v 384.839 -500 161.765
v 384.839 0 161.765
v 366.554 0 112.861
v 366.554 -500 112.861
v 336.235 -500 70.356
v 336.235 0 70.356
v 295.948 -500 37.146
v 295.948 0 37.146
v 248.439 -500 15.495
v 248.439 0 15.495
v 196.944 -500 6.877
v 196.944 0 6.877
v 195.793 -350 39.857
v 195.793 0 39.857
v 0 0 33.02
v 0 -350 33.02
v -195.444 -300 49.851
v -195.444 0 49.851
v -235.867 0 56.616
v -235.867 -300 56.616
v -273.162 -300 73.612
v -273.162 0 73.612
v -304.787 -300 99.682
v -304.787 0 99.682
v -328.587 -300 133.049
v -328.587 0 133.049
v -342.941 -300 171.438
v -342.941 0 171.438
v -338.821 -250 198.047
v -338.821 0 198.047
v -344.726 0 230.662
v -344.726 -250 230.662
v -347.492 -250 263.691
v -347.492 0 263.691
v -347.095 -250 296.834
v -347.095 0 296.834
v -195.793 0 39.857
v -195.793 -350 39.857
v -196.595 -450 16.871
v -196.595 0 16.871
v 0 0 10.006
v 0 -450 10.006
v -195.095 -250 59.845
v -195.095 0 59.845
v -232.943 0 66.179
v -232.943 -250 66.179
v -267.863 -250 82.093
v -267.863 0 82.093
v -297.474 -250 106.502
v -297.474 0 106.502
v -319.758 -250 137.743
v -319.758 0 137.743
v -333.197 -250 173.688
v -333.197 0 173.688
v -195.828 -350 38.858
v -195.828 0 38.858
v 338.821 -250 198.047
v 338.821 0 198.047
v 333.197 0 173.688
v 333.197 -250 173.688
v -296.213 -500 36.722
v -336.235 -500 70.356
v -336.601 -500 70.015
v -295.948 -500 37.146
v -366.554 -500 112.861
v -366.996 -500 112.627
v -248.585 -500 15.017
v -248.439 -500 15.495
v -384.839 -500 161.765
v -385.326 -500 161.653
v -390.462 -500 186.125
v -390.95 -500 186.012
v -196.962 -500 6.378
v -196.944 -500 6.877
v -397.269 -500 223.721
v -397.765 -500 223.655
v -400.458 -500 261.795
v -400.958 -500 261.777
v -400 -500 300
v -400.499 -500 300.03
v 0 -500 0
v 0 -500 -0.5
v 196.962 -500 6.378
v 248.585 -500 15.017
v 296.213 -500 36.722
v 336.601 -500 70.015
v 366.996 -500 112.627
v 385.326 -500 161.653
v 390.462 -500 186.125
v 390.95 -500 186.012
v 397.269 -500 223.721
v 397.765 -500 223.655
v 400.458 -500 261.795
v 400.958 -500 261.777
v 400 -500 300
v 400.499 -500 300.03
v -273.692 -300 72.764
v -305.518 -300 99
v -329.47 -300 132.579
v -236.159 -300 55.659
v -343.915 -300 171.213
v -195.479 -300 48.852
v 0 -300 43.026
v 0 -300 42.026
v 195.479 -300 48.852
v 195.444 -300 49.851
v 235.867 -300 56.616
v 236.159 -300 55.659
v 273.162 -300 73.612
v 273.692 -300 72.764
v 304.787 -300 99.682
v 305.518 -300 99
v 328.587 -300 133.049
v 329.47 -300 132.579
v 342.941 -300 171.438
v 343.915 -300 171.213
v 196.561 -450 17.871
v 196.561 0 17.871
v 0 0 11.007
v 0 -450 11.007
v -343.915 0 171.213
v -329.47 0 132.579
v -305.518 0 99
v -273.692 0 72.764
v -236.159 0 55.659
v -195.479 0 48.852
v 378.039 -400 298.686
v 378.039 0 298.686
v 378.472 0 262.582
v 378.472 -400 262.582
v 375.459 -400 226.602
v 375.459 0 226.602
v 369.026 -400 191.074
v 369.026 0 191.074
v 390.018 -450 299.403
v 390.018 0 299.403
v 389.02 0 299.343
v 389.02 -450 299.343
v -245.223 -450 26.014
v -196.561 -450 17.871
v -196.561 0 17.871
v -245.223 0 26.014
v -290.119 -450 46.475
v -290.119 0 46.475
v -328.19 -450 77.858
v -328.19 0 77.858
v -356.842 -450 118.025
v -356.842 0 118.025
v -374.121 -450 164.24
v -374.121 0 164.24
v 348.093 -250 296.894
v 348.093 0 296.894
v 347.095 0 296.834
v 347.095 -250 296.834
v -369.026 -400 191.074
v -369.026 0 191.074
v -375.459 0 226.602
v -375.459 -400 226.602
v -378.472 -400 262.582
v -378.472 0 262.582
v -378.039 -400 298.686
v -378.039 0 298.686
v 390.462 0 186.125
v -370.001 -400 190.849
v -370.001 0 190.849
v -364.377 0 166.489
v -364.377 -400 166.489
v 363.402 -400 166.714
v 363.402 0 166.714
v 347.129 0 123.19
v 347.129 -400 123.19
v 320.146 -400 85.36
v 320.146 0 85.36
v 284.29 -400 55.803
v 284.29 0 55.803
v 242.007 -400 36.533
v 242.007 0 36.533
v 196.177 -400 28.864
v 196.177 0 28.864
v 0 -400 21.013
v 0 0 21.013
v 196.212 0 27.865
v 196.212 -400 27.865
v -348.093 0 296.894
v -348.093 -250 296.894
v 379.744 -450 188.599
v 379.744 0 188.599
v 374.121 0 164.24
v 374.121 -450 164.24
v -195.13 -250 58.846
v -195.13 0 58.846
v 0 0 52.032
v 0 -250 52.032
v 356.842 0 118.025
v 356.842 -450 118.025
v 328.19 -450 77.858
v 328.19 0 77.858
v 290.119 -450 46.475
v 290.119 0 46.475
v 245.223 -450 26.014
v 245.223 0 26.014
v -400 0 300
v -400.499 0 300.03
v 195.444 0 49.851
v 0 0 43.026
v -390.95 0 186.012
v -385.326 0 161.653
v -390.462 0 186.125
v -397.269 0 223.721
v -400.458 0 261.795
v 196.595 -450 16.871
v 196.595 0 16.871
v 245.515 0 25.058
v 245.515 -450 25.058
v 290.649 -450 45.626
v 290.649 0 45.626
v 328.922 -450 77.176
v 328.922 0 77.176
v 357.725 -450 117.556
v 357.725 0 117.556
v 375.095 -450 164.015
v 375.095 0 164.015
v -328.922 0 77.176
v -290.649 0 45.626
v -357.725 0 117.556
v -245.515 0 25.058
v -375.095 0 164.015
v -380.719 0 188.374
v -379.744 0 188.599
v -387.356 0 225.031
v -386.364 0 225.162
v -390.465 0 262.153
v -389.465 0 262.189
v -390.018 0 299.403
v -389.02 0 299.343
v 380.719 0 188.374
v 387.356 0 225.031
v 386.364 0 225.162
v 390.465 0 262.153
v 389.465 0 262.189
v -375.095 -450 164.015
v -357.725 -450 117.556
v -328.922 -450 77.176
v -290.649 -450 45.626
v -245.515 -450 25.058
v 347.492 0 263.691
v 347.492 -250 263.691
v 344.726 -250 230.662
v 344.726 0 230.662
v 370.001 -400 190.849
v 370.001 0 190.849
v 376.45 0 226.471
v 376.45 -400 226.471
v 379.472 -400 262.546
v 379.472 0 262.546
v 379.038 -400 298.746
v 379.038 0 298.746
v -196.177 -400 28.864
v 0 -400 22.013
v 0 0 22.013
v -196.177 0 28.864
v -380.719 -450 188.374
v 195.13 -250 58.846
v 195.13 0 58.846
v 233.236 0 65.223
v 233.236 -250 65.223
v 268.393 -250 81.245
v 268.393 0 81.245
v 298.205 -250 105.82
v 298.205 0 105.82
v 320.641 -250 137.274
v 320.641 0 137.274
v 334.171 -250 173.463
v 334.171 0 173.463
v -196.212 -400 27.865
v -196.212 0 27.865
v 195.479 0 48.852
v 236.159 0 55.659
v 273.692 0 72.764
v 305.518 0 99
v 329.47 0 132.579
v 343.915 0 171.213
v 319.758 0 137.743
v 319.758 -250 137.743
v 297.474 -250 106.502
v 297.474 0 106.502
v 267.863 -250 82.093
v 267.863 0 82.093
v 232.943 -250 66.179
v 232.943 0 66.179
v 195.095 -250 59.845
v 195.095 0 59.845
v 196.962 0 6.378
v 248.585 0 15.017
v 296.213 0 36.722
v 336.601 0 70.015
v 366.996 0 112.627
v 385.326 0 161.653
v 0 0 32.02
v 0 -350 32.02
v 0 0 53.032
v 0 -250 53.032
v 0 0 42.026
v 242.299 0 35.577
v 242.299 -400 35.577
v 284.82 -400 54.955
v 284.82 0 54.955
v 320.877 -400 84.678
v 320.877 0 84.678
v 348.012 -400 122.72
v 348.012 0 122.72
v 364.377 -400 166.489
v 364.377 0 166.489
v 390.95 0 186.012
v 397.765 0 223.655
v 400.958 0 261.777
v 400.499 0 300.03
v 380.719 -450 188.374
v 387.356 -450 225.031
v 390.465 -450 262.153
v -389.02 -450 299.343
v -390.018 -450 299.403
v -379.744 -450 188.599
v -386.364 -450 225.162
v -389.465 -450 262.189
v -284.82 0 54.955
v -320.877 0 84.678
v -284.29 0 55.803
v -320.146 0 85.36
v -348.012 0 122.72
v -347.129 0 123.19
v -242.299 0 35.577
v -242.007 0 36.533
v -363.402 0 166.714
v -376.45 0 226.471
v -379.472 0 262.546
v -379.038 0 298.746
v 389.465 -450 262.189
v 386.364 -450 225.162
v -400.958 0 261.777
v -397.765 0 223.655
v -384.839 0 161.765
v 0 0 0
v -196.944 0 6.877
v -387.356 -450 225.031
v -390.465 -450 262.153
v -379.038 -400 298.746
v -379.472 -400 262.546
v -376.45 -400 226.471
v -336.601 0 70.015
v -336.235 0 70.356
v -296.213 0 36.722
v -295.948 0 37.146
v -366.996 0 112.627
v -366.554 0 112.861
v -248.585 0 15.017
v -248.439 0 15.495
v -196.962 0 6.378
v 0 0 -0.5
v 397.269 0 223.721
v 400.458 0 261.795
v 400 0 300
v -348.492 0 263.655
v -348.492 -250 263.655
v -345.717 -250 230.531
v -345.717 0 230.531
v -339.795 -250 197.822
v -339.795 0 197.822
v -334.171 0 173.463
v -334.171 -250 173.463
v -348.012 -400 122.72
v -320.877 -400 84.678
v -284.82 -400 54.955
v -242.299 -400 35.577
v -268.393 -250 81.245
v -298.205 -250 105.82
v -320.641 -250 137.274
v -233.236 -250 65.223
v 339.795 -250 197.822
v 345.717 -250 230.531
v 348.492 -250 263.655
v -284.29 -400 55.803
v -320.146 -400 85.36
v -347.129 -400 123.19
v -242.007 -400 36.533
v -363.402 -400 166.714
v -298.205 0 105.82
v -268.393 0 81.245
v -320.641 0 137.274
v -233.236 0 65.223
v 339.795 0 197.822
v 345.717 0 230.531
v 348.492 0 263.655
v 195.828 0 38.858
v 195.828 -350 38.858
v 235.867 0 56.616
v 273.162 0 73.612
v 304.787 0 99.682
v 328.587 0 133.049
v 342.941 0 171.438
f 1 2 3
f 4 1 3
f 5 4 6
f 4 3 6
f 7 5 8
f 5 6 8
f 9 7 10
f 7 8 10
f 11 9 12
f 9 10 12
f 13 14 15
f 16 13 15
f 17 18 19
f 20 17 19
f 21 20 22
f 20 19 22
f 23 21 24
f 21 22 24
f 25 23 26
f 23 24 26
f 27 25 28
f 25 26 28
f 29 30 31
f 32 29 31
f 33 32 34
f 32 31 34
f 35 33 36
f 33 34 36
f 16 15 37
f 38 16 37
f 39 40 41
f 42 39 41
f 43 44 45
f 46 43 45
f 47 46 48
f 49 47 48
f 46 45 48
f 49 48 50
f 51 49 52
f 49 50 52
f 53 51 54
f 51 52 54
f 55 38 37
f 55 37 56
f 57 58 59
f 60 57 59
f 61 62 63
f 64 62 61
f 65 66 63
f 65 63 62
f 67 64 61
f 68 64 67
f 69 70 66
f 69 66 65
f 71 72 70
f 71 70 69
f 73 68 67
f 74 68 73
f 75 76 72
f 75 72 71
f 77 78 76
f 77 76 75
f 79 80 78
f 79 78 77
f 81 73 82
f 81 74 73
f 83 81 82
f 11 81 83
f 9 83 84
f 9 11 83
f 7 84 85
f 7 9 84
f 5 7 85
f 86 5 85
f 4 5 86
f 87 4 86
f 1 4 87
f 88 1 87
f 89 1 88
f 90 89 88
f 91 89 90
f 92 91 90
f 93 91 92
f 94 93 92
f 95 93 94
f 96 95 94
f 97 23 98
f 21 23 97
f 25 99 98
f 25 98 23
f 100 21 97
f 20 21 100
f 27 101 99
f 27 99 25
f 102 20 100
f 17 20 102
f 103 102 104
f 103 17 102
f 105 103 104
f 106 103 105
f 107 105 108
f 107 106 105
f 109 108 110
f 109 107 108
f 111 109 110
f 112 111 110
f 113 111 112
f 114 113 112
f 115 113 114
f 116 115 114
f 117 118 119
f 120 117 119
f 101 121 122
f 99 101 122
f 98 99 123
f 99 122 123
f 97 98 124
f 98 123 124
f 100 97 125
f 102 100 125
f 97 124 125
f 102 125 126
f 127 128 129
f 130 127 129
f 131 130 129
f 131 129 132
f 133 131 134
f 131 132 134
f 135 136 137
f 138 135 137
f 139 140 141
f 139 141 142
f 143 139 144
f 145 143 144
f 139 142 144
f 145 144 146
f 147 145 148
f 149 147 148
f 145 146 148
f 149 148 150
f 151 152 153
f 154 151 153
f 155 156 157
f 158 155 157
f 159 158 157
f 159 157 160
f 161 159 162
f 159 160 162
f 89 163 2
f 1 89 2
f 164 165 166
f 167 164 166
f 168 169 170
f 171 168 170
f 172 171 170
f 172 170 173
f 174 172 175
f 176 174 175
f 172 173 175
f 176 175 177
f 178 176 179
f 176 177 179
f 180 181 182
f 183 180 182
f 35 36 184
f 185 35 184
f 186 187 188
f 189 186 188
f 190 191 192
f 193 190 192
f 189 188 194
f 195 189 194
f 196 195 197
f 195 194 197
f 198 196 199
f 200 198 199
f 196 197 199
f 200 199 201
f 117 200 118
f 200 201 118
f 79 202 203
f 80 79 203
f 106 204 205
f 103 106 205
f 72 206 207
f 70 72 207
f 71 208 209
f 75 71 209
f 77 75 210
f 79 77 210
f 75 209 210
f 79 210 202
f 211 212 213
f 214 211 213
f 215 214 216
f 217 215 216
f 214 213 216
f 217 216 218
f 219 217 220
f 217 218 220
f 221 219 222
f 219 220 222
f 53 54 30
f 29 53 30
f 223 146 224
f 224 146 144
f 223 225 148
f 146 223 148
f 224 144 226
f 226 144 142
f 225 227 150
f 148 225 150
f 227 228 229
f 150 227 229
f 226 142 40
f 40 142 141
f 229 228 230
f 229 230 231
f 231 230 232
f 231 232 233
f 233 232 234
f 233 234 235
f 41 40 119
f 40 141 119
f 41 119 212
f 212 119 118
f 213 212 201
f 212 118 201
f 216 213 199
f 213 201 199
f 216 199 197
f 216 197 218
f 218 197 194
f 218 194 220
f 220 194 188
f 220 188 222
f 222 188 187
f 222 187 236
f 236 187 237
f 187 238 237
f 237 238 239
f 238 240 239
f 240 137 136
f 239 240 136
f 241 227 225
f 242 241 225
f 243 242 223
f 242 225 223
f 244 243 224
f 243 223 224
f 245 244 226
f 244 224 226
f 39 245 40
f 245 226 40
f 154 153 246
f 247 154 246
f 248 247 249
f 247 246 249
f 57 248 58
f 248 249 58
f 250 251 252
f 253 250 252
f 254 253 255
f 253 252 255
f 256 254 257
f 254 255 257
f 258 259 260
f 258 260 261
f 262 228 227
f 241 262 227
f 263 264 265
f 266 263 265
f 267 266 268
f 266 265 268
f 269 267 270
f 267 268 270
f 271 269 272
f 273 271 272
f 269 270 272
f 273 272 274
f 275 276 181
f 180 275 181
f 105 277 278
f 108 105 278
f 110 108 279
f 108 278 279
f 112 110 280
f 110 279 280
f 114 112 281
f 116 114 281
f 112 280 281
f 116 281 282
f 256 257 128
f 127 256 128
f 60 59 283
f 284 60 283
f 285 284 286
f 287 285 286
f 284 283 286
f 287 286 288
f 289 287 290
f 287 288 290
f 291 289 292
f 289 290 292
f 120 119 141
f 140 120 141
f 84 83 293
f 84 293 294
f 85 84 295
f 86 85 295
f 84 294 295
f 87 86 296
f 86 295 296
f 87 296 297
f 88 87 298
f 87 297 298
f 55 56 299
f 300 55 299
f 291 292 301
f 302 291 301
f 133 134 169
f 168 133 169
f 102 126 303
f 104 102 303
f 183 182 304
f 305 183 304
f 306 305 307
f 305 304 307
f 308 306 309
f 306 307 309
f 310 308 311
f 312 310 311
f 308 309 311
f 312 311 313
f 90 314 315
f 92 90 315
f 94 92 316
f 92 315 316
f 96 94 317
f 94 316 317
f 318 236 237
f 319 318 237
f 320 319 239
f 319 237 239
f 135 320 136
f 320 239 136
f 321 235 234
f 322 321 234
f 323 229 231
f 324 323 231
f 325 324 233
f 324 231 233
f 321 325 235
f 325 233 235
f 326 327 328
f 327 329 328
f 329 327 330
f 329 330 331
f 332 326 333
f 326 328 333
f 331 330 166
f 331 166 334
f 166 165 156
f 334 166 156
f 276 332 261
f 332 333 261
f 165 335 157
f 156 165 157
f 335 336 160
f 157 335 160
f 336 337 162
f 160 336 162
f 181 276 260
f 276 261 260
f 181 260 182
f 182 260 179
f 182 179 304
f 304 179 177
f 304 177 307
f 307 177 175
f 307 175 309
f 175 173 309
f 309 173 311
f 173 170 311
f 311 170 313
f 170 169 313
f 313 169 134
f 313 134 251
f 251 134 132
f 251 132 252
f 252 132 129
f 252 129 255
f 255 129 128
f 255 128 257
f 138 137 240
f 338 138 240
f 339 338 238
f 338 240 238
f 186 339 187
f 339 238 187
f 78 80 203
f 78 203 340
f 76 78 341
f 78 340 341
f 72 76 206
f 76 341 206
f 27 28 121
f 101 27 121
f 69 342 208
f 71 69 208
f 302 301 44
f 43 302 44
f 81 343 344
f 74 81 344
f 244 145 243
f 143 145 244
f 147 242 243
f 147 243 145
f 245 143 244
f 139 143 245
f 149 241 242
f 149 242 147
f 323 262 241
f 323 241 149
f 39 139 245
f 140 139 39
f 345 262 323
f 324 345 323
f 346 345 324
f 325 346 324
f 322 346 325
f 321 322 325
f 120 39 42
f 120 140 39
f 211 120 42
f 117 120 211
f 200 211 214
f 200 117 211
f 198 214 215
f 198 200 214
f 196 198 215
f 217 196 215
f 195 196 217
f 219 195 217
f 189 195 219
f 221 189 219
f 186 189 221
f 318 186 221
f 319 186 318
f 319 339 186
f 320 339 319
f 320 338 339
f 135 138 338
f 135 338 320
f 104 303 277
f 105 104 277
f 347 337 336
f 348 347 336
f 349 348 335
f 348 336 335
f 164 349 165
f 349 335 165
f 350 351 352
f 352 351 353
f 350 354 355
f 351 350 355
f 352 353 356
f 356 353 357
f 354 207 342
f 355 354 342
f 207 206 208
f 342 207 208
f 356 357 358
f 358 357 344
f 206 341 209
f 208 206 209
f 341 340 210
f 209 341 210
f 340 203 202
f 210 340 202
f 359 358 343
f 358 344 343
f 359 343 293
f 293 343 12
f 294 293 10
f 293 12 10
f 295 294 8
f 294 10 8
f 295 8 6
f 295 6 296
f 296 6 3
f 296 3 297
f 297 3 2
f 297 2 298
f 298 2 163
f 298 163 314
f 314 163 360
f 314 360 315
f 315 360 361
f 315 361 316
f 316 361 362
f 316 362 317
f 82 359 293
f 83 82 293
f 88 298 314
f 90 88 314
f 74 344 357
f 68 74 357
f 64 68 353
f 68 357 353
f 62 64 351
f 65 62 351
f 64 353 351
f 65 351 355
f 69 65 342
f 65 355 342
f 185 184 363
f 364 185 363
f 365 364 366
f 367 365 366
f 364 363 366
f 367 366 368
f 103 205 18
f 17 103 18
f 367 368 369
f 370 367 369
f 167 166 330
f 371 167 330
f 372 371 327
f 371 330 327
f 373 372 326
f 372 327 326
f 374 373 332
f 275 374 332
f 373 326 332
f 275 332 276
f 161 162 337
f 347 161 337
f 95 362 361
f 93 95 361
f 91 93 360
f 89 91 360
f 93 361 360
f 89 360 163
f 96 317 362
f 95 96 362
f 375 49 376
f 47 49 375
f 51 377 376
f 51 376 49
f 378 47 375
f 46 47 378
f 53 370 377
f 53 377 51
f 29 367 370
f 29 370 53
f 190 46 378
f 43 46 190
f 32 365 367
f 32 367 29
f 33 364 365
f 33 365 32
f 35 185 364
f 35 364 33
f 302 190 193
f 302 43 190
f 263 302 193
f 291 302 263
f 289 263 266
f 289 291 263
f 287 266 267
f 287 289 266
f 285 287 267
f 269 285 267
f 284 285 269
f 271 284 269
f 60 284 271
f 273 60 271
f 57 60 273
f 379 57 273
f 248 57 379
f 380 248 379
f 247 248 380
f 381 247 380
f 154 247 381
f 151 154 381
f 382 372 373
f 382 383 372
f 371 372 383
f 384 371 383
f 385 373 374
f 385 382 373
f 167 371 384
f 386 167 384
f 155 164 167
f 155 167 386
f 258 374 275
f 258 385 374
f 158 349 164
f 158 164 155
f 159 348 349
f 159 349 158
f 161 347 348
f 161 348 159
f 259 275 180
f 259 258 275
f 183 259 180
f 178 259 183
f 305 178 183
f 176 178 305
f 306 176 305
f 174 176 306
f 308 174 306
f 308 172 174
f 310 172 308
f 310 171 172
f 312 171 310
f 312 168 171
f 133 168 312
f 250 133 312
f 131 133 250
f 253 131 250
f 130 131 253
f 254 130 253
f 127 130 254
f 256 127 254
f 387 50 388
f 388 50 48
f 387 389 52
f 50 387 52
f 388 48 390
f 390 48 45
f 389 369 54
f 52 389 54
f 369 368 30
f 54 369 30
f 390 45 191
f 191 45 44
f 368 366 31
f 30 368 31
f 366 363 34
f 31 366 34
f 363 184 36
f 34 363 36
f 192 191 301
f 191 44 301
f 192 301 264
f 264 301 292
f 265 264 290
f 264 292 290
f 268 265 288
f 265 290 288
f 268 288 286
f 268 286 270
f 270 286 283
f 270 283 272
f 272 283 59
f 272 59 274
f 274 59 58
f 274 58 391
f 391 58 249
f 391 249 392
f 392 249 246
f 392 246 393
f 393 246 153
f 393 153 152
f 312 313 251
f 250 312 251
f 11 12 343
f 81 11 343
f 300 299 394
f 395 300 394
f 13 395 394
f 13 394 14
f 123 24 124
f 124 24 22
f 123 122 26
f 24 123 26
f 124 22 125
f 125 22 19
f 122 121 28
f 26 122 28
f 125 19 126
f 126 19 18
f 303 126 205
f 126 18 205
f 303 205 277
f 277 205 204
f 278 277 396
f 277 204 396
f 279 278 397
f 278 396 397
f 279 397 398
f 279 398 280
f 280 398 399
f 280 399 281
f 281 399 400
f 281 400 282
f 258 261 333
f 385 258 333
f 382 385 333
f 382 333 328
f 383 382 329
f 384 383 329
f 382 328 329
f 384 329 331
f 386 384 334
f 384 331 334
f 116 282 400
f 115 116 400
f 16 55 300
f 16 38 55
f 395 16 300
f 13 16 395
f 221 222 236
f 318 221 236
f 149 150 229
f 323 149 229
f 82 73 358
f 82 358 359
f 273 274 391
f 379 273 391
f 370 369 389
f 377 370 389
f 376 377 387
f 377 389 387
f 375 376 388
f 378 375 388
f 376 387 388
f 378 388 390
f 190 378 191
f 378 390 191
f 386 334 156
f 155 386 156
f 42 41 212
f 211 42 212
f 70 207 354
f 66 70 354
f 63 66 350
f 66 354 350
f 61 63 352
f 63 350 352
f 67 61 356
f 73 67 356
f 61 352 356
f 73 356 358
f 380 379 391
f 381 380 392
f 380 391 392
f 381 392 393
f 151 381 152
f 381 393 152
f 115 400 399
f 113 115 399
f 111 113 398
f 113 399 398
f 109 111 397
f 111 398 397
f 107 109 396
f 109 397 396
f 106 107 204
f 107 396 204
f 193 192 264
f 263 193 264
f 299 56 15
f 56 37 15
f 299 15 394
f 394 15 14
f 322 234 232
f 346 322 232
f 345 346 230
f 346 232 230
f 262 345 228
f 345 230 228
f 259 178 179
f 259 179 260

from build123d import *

# Parameters (mm, degrees)
F1_DEPTH  = 500
F3_DEPTH  = 450
F5_DEPTH  = 400
F7_DEPTH  = 350
F9_DEPTH  = 300
F11_DEPTH = 250


with BuildPart() as f1:
    # F0 (on Front) → F1 (new body)
    with BuildSketch(Plane.XZ):
        with BuildLine():
            Line((196.944483, 6.877453), (0, 0))
            Line((0, 0), (-196.944483, 6.877453))
            ThreePointArc((-196.944483, 6.877453), (-317.180227, 52.430702), (-384.838596, 161.765407))
            Line((-384.838596, 161.765407), (-390.462373, 186.124659))
            ThreePointArc((-390.462373, 186.124659), (-399.318706, 242.719979), (-400, 300))
            Line((-400, 300), (-400.499107, 300.029869))
            ThreePointArc((-400.499107, 300.029869), (-399.816961, 242.678248), (-390.949558, 186.012184))
            Line((-390.949558, 186.012184), (-385.325781, 161.652932))
            ThreePointArc((-385.325781, 161.652932), (-317.498267, 52.044889), (-196.961933, 6.377757))
            Line((-196.961933, 6.377757), (0, -0.500305))
            Line((0, -0.500305), (196.961933, 6.377757))
            ThreePointArc((196.961933, 6.377757), (317.498267, 52.044889), (385.325781, 161.652932))
            Line((385.325781, 161.652932), (390.949558, 186.012184))
            ThreePointArc((390.949558, 186.012184), (399.816961, 242.678248), (400.499107, 300.029869))
            Line((400.499107, 300.029869), (400, 300))
            ThreePointArc((400, 300), (399.318706, 242.719979), (390.462373, 186.124659))
            Line((390.462373, 186.124659), (384.838596, 161.765407))
            ThreePointArc((384.838596, 161.765407), (317.180227, 52.430702), (196.944483, 6.877453))
        make_face()
    extrude(amount=F1_DEPTH)


with BuildPart() as f3:
    # F2 (on Front) → F3 (new body)
    with BuildSketch(Plane.XZ):
        with BuildLine():
            ThreePointArc((-390.017859, 299.402627), (-389.353597, 243.554607), (-380.718672, 188.37417))
            Line((-380.718672, 188.37417), (-375.094896, 164.014918))
            ThreePointArc((-375.094896, 164.014918), (-310.819445, 60.146947), (-196.595488, 16.871361))
            Line((-196.595488, 16.871361), (0, 10.006095))
            Line((0, 10.006095), (196.595488, 16.871361))
            ThreePointArc((196.595488, 16.871361), (310.819445, 60.146947), (375.094896, 164.014918))
            Line((375.094896, 164.014918), (380.718672, 188.37417))
            ThreePointArc((380.718672, 188.37417), (389.353597, 243.554607), (390.017859, 299.402627))
            Line((390.017859, 299.402627), (389.019645, 299.34289))
            ThreePointArc((389.019645, 299.34289), (388.357086, 243.63807), (379.744302, 188.599121))
            Line((379.744302, 188.599121), (374.120526, 164.239869))
            ThreePointArc((374.120526, 164.239869), (310.183367, 60.918572), (196.560588, 17.870752))
            Line((196.560588, 17.870752), (0, 11.006705))
            Line((0, 11.006705), (-196.560588, 17.870752))
            ThreePointArc((-196.560588, 17.870752), (-310.183367, 60.918572), (-374.120526, 164.239869))
            Line((-374.120526, 164.239869), (-379.744302, 188.599121))
            ThreePointArc((-379.744302, 188.599121), (-388.357086, 243.63807), (-389.019645, 299.34289))
            Line((-389.019645, 299.34289), (-390.017859, 299.402627))
        make_face()
    extrude(amount=F3_DEPTH)


with BuildPart() as f5:
    # F4 (on Front) → F5 (new body)
    with BuildSketch(Plane.XZ):
        with BuildLine():
            ThreePointArc((-379.037503, 298.745517), (-378.391977, 244.472697), (-370.000601, 190.848631))
            Line((-370.000601, 190.848631), (-364.376825, 166.48938))
            ThreePointArc((-364.376825, 166.48938), (-303.822585, 68.634818), (-196.211593, 27.86466))
            Line((-196.211593, 27.86466), (0, 21.0128))
            Line((0, 21.0128), (196.211593, 27.86466))
            ThreePointArc((196.211593, 27.86466), (303.822585, 68.634818), (364.376825, 166.48938))
            Line((364.376825, 166.48938), (370.000601, 190.848631))
            ThreePointArc((370.000601, 190.848631), (378.391977, 244.472697), (379.037503, 298.745517))
            Line((379.037503, 298.745517), (378.039289, 298.685779))
            ThreePointArc((378.039289, 298.685779), (377.395466, 244.55616), (369.026231, 191.073582))
            Line((369.026231, 191.073582), (363.402455, 166.714331))
            ThreePointArc((363.402455, 166.714331), (303.186507, 69.406442), (196.176694, 28.864051))
            Line((196.176694, 28.864051), (0, 22.01341))
            Line((0, 22.01341), (-196.176694, 28.864051))
            ThreePointArc((-196.176694, 28.864051), (-303.186507, 69.406442), (-363.402455, 166.714331))
            Line((-363.402455, 166.714331), (-369.026231, 191.073582))
            ThreePointArc((-369.026231, 191.073582), (-377.395466, 244.55616), (-378.039289, 298.685779))
            Line((-378.039289, 298.685779), (-379.037503, 298.745517))
        make_face()
    extrude(amount=F5_DEPTH)


with BuildPart() as f7:
    # F6 (on Front) → F7 (new body)
    with BuildSketch(Plane.XZ):
        Polygon((-195.827699, 38.857959), (0, 32.019505), (195.827699, 38.857959), (195.792799, 39.85735), (0, 33.020115), (-195.792799, 39.85735), align=None)
    extrude(amount=F7_DEPTH)


with BuildPart() as f9:
    # F8 (on Front) → F9 (new body)
    with BuildSketch(Plane.XZ):
        with BuildLine():
            ThreePointArc((-343.915054, 171.213352), (-290.464942, 84.838934), (-195.478704, 48.851868))
            Line((-195.478704, 48.851868), (0, 42.025601))
            Line((0, 42.025601), (195.478704, 48.851868))
            ThreePointArc((195.478704, 48.851868), (290.464942, 84.838934), (343.915054, 171.213352))
            Line((343.915054, 171.213352), (342.940684, 171.438303))
            ThreePointArc((342.940684, 171.438303), (289.828864, 85.610559), (195.443804, 49.851258))
            Line((195.443804, 49.851258), (0, 43.02621))
            Line((0, 43.02621), (-195.443804, 49.851258))
            ThreePointArc((-195.443804, 49.851258), (-289.828864, 85.610559), (-342.940684, 171.438303))
            Line((-342.940684, 171.438303), (-343.915054, 171.213352))
        make_face()
    extrude(amount=F9_DEPTH)


with BuildPart() as f11:
    # F10 (on Front) → F11 (new body)
    with BuildSketch(Plane.XZ):
        with BuildLine():
            ThreePointArc((-348.092865, 296.893661), (-347.500139, 247.060043), (-339.795129, 197.822114))
            Line((-339.795129, 197.822114), (-334.171353, 173.462862))
            ThreePointArc((-334.171353, 173.462862), (-284.10416, 92.55518), (-195.129709, 58.845776))
            Line((-195.129709, 58.845776), (0, 52.031696))
            Line((0, 52.031696), (195.129709, 58.845776))
            ThreePointArc((195.129709, 58.845776), (284.10416, 92.55518), (334.171353, 173.462862))
            Line((334.171353, 173.462862), (339.795129, 197.822114))
            ThreePointArc((339.795129, 197.822114), (347.500139, 247.060043), (348.092865, 296.893661))
            Line((348.092865, 296.893661), (347.094651, 296.833923))
            ThreePointArc((347.094651, 296.833923), (346.503628, 247.143505), (338.820759, 198.047065))
            Line((338.820759, 198.047065), (333.196983, 173.687813))
            ThreePointArc((333.196983, 173.687813), (283.468082, 93.326805), (195.094809, 59.845167))
            Line((195.094809, 59.845167), (0, 53.032306))
            Line((0, 53.032306), (-195.094809, 59.845167))
            ThreePointArc((-195.094809, 59.845167), (-283.468082, 93.326805), (-333.196983, 173.687813))
            Line((-333.196983, 173.687813), (-338.820759, 198.047065))
            ThreePointArc((-338.820759, 198.047065), (-346.503628, 247.143505), (-347.094651, 296.833923))
            Line((-347.094651, 296.833923), (-348.092865, 296.893661))
        make_face()
    extrude(amount=F11_DEPTH)


solid = Compound([f1.part, f3.part, f5.part, f7.part, f9.part, f11.part])
